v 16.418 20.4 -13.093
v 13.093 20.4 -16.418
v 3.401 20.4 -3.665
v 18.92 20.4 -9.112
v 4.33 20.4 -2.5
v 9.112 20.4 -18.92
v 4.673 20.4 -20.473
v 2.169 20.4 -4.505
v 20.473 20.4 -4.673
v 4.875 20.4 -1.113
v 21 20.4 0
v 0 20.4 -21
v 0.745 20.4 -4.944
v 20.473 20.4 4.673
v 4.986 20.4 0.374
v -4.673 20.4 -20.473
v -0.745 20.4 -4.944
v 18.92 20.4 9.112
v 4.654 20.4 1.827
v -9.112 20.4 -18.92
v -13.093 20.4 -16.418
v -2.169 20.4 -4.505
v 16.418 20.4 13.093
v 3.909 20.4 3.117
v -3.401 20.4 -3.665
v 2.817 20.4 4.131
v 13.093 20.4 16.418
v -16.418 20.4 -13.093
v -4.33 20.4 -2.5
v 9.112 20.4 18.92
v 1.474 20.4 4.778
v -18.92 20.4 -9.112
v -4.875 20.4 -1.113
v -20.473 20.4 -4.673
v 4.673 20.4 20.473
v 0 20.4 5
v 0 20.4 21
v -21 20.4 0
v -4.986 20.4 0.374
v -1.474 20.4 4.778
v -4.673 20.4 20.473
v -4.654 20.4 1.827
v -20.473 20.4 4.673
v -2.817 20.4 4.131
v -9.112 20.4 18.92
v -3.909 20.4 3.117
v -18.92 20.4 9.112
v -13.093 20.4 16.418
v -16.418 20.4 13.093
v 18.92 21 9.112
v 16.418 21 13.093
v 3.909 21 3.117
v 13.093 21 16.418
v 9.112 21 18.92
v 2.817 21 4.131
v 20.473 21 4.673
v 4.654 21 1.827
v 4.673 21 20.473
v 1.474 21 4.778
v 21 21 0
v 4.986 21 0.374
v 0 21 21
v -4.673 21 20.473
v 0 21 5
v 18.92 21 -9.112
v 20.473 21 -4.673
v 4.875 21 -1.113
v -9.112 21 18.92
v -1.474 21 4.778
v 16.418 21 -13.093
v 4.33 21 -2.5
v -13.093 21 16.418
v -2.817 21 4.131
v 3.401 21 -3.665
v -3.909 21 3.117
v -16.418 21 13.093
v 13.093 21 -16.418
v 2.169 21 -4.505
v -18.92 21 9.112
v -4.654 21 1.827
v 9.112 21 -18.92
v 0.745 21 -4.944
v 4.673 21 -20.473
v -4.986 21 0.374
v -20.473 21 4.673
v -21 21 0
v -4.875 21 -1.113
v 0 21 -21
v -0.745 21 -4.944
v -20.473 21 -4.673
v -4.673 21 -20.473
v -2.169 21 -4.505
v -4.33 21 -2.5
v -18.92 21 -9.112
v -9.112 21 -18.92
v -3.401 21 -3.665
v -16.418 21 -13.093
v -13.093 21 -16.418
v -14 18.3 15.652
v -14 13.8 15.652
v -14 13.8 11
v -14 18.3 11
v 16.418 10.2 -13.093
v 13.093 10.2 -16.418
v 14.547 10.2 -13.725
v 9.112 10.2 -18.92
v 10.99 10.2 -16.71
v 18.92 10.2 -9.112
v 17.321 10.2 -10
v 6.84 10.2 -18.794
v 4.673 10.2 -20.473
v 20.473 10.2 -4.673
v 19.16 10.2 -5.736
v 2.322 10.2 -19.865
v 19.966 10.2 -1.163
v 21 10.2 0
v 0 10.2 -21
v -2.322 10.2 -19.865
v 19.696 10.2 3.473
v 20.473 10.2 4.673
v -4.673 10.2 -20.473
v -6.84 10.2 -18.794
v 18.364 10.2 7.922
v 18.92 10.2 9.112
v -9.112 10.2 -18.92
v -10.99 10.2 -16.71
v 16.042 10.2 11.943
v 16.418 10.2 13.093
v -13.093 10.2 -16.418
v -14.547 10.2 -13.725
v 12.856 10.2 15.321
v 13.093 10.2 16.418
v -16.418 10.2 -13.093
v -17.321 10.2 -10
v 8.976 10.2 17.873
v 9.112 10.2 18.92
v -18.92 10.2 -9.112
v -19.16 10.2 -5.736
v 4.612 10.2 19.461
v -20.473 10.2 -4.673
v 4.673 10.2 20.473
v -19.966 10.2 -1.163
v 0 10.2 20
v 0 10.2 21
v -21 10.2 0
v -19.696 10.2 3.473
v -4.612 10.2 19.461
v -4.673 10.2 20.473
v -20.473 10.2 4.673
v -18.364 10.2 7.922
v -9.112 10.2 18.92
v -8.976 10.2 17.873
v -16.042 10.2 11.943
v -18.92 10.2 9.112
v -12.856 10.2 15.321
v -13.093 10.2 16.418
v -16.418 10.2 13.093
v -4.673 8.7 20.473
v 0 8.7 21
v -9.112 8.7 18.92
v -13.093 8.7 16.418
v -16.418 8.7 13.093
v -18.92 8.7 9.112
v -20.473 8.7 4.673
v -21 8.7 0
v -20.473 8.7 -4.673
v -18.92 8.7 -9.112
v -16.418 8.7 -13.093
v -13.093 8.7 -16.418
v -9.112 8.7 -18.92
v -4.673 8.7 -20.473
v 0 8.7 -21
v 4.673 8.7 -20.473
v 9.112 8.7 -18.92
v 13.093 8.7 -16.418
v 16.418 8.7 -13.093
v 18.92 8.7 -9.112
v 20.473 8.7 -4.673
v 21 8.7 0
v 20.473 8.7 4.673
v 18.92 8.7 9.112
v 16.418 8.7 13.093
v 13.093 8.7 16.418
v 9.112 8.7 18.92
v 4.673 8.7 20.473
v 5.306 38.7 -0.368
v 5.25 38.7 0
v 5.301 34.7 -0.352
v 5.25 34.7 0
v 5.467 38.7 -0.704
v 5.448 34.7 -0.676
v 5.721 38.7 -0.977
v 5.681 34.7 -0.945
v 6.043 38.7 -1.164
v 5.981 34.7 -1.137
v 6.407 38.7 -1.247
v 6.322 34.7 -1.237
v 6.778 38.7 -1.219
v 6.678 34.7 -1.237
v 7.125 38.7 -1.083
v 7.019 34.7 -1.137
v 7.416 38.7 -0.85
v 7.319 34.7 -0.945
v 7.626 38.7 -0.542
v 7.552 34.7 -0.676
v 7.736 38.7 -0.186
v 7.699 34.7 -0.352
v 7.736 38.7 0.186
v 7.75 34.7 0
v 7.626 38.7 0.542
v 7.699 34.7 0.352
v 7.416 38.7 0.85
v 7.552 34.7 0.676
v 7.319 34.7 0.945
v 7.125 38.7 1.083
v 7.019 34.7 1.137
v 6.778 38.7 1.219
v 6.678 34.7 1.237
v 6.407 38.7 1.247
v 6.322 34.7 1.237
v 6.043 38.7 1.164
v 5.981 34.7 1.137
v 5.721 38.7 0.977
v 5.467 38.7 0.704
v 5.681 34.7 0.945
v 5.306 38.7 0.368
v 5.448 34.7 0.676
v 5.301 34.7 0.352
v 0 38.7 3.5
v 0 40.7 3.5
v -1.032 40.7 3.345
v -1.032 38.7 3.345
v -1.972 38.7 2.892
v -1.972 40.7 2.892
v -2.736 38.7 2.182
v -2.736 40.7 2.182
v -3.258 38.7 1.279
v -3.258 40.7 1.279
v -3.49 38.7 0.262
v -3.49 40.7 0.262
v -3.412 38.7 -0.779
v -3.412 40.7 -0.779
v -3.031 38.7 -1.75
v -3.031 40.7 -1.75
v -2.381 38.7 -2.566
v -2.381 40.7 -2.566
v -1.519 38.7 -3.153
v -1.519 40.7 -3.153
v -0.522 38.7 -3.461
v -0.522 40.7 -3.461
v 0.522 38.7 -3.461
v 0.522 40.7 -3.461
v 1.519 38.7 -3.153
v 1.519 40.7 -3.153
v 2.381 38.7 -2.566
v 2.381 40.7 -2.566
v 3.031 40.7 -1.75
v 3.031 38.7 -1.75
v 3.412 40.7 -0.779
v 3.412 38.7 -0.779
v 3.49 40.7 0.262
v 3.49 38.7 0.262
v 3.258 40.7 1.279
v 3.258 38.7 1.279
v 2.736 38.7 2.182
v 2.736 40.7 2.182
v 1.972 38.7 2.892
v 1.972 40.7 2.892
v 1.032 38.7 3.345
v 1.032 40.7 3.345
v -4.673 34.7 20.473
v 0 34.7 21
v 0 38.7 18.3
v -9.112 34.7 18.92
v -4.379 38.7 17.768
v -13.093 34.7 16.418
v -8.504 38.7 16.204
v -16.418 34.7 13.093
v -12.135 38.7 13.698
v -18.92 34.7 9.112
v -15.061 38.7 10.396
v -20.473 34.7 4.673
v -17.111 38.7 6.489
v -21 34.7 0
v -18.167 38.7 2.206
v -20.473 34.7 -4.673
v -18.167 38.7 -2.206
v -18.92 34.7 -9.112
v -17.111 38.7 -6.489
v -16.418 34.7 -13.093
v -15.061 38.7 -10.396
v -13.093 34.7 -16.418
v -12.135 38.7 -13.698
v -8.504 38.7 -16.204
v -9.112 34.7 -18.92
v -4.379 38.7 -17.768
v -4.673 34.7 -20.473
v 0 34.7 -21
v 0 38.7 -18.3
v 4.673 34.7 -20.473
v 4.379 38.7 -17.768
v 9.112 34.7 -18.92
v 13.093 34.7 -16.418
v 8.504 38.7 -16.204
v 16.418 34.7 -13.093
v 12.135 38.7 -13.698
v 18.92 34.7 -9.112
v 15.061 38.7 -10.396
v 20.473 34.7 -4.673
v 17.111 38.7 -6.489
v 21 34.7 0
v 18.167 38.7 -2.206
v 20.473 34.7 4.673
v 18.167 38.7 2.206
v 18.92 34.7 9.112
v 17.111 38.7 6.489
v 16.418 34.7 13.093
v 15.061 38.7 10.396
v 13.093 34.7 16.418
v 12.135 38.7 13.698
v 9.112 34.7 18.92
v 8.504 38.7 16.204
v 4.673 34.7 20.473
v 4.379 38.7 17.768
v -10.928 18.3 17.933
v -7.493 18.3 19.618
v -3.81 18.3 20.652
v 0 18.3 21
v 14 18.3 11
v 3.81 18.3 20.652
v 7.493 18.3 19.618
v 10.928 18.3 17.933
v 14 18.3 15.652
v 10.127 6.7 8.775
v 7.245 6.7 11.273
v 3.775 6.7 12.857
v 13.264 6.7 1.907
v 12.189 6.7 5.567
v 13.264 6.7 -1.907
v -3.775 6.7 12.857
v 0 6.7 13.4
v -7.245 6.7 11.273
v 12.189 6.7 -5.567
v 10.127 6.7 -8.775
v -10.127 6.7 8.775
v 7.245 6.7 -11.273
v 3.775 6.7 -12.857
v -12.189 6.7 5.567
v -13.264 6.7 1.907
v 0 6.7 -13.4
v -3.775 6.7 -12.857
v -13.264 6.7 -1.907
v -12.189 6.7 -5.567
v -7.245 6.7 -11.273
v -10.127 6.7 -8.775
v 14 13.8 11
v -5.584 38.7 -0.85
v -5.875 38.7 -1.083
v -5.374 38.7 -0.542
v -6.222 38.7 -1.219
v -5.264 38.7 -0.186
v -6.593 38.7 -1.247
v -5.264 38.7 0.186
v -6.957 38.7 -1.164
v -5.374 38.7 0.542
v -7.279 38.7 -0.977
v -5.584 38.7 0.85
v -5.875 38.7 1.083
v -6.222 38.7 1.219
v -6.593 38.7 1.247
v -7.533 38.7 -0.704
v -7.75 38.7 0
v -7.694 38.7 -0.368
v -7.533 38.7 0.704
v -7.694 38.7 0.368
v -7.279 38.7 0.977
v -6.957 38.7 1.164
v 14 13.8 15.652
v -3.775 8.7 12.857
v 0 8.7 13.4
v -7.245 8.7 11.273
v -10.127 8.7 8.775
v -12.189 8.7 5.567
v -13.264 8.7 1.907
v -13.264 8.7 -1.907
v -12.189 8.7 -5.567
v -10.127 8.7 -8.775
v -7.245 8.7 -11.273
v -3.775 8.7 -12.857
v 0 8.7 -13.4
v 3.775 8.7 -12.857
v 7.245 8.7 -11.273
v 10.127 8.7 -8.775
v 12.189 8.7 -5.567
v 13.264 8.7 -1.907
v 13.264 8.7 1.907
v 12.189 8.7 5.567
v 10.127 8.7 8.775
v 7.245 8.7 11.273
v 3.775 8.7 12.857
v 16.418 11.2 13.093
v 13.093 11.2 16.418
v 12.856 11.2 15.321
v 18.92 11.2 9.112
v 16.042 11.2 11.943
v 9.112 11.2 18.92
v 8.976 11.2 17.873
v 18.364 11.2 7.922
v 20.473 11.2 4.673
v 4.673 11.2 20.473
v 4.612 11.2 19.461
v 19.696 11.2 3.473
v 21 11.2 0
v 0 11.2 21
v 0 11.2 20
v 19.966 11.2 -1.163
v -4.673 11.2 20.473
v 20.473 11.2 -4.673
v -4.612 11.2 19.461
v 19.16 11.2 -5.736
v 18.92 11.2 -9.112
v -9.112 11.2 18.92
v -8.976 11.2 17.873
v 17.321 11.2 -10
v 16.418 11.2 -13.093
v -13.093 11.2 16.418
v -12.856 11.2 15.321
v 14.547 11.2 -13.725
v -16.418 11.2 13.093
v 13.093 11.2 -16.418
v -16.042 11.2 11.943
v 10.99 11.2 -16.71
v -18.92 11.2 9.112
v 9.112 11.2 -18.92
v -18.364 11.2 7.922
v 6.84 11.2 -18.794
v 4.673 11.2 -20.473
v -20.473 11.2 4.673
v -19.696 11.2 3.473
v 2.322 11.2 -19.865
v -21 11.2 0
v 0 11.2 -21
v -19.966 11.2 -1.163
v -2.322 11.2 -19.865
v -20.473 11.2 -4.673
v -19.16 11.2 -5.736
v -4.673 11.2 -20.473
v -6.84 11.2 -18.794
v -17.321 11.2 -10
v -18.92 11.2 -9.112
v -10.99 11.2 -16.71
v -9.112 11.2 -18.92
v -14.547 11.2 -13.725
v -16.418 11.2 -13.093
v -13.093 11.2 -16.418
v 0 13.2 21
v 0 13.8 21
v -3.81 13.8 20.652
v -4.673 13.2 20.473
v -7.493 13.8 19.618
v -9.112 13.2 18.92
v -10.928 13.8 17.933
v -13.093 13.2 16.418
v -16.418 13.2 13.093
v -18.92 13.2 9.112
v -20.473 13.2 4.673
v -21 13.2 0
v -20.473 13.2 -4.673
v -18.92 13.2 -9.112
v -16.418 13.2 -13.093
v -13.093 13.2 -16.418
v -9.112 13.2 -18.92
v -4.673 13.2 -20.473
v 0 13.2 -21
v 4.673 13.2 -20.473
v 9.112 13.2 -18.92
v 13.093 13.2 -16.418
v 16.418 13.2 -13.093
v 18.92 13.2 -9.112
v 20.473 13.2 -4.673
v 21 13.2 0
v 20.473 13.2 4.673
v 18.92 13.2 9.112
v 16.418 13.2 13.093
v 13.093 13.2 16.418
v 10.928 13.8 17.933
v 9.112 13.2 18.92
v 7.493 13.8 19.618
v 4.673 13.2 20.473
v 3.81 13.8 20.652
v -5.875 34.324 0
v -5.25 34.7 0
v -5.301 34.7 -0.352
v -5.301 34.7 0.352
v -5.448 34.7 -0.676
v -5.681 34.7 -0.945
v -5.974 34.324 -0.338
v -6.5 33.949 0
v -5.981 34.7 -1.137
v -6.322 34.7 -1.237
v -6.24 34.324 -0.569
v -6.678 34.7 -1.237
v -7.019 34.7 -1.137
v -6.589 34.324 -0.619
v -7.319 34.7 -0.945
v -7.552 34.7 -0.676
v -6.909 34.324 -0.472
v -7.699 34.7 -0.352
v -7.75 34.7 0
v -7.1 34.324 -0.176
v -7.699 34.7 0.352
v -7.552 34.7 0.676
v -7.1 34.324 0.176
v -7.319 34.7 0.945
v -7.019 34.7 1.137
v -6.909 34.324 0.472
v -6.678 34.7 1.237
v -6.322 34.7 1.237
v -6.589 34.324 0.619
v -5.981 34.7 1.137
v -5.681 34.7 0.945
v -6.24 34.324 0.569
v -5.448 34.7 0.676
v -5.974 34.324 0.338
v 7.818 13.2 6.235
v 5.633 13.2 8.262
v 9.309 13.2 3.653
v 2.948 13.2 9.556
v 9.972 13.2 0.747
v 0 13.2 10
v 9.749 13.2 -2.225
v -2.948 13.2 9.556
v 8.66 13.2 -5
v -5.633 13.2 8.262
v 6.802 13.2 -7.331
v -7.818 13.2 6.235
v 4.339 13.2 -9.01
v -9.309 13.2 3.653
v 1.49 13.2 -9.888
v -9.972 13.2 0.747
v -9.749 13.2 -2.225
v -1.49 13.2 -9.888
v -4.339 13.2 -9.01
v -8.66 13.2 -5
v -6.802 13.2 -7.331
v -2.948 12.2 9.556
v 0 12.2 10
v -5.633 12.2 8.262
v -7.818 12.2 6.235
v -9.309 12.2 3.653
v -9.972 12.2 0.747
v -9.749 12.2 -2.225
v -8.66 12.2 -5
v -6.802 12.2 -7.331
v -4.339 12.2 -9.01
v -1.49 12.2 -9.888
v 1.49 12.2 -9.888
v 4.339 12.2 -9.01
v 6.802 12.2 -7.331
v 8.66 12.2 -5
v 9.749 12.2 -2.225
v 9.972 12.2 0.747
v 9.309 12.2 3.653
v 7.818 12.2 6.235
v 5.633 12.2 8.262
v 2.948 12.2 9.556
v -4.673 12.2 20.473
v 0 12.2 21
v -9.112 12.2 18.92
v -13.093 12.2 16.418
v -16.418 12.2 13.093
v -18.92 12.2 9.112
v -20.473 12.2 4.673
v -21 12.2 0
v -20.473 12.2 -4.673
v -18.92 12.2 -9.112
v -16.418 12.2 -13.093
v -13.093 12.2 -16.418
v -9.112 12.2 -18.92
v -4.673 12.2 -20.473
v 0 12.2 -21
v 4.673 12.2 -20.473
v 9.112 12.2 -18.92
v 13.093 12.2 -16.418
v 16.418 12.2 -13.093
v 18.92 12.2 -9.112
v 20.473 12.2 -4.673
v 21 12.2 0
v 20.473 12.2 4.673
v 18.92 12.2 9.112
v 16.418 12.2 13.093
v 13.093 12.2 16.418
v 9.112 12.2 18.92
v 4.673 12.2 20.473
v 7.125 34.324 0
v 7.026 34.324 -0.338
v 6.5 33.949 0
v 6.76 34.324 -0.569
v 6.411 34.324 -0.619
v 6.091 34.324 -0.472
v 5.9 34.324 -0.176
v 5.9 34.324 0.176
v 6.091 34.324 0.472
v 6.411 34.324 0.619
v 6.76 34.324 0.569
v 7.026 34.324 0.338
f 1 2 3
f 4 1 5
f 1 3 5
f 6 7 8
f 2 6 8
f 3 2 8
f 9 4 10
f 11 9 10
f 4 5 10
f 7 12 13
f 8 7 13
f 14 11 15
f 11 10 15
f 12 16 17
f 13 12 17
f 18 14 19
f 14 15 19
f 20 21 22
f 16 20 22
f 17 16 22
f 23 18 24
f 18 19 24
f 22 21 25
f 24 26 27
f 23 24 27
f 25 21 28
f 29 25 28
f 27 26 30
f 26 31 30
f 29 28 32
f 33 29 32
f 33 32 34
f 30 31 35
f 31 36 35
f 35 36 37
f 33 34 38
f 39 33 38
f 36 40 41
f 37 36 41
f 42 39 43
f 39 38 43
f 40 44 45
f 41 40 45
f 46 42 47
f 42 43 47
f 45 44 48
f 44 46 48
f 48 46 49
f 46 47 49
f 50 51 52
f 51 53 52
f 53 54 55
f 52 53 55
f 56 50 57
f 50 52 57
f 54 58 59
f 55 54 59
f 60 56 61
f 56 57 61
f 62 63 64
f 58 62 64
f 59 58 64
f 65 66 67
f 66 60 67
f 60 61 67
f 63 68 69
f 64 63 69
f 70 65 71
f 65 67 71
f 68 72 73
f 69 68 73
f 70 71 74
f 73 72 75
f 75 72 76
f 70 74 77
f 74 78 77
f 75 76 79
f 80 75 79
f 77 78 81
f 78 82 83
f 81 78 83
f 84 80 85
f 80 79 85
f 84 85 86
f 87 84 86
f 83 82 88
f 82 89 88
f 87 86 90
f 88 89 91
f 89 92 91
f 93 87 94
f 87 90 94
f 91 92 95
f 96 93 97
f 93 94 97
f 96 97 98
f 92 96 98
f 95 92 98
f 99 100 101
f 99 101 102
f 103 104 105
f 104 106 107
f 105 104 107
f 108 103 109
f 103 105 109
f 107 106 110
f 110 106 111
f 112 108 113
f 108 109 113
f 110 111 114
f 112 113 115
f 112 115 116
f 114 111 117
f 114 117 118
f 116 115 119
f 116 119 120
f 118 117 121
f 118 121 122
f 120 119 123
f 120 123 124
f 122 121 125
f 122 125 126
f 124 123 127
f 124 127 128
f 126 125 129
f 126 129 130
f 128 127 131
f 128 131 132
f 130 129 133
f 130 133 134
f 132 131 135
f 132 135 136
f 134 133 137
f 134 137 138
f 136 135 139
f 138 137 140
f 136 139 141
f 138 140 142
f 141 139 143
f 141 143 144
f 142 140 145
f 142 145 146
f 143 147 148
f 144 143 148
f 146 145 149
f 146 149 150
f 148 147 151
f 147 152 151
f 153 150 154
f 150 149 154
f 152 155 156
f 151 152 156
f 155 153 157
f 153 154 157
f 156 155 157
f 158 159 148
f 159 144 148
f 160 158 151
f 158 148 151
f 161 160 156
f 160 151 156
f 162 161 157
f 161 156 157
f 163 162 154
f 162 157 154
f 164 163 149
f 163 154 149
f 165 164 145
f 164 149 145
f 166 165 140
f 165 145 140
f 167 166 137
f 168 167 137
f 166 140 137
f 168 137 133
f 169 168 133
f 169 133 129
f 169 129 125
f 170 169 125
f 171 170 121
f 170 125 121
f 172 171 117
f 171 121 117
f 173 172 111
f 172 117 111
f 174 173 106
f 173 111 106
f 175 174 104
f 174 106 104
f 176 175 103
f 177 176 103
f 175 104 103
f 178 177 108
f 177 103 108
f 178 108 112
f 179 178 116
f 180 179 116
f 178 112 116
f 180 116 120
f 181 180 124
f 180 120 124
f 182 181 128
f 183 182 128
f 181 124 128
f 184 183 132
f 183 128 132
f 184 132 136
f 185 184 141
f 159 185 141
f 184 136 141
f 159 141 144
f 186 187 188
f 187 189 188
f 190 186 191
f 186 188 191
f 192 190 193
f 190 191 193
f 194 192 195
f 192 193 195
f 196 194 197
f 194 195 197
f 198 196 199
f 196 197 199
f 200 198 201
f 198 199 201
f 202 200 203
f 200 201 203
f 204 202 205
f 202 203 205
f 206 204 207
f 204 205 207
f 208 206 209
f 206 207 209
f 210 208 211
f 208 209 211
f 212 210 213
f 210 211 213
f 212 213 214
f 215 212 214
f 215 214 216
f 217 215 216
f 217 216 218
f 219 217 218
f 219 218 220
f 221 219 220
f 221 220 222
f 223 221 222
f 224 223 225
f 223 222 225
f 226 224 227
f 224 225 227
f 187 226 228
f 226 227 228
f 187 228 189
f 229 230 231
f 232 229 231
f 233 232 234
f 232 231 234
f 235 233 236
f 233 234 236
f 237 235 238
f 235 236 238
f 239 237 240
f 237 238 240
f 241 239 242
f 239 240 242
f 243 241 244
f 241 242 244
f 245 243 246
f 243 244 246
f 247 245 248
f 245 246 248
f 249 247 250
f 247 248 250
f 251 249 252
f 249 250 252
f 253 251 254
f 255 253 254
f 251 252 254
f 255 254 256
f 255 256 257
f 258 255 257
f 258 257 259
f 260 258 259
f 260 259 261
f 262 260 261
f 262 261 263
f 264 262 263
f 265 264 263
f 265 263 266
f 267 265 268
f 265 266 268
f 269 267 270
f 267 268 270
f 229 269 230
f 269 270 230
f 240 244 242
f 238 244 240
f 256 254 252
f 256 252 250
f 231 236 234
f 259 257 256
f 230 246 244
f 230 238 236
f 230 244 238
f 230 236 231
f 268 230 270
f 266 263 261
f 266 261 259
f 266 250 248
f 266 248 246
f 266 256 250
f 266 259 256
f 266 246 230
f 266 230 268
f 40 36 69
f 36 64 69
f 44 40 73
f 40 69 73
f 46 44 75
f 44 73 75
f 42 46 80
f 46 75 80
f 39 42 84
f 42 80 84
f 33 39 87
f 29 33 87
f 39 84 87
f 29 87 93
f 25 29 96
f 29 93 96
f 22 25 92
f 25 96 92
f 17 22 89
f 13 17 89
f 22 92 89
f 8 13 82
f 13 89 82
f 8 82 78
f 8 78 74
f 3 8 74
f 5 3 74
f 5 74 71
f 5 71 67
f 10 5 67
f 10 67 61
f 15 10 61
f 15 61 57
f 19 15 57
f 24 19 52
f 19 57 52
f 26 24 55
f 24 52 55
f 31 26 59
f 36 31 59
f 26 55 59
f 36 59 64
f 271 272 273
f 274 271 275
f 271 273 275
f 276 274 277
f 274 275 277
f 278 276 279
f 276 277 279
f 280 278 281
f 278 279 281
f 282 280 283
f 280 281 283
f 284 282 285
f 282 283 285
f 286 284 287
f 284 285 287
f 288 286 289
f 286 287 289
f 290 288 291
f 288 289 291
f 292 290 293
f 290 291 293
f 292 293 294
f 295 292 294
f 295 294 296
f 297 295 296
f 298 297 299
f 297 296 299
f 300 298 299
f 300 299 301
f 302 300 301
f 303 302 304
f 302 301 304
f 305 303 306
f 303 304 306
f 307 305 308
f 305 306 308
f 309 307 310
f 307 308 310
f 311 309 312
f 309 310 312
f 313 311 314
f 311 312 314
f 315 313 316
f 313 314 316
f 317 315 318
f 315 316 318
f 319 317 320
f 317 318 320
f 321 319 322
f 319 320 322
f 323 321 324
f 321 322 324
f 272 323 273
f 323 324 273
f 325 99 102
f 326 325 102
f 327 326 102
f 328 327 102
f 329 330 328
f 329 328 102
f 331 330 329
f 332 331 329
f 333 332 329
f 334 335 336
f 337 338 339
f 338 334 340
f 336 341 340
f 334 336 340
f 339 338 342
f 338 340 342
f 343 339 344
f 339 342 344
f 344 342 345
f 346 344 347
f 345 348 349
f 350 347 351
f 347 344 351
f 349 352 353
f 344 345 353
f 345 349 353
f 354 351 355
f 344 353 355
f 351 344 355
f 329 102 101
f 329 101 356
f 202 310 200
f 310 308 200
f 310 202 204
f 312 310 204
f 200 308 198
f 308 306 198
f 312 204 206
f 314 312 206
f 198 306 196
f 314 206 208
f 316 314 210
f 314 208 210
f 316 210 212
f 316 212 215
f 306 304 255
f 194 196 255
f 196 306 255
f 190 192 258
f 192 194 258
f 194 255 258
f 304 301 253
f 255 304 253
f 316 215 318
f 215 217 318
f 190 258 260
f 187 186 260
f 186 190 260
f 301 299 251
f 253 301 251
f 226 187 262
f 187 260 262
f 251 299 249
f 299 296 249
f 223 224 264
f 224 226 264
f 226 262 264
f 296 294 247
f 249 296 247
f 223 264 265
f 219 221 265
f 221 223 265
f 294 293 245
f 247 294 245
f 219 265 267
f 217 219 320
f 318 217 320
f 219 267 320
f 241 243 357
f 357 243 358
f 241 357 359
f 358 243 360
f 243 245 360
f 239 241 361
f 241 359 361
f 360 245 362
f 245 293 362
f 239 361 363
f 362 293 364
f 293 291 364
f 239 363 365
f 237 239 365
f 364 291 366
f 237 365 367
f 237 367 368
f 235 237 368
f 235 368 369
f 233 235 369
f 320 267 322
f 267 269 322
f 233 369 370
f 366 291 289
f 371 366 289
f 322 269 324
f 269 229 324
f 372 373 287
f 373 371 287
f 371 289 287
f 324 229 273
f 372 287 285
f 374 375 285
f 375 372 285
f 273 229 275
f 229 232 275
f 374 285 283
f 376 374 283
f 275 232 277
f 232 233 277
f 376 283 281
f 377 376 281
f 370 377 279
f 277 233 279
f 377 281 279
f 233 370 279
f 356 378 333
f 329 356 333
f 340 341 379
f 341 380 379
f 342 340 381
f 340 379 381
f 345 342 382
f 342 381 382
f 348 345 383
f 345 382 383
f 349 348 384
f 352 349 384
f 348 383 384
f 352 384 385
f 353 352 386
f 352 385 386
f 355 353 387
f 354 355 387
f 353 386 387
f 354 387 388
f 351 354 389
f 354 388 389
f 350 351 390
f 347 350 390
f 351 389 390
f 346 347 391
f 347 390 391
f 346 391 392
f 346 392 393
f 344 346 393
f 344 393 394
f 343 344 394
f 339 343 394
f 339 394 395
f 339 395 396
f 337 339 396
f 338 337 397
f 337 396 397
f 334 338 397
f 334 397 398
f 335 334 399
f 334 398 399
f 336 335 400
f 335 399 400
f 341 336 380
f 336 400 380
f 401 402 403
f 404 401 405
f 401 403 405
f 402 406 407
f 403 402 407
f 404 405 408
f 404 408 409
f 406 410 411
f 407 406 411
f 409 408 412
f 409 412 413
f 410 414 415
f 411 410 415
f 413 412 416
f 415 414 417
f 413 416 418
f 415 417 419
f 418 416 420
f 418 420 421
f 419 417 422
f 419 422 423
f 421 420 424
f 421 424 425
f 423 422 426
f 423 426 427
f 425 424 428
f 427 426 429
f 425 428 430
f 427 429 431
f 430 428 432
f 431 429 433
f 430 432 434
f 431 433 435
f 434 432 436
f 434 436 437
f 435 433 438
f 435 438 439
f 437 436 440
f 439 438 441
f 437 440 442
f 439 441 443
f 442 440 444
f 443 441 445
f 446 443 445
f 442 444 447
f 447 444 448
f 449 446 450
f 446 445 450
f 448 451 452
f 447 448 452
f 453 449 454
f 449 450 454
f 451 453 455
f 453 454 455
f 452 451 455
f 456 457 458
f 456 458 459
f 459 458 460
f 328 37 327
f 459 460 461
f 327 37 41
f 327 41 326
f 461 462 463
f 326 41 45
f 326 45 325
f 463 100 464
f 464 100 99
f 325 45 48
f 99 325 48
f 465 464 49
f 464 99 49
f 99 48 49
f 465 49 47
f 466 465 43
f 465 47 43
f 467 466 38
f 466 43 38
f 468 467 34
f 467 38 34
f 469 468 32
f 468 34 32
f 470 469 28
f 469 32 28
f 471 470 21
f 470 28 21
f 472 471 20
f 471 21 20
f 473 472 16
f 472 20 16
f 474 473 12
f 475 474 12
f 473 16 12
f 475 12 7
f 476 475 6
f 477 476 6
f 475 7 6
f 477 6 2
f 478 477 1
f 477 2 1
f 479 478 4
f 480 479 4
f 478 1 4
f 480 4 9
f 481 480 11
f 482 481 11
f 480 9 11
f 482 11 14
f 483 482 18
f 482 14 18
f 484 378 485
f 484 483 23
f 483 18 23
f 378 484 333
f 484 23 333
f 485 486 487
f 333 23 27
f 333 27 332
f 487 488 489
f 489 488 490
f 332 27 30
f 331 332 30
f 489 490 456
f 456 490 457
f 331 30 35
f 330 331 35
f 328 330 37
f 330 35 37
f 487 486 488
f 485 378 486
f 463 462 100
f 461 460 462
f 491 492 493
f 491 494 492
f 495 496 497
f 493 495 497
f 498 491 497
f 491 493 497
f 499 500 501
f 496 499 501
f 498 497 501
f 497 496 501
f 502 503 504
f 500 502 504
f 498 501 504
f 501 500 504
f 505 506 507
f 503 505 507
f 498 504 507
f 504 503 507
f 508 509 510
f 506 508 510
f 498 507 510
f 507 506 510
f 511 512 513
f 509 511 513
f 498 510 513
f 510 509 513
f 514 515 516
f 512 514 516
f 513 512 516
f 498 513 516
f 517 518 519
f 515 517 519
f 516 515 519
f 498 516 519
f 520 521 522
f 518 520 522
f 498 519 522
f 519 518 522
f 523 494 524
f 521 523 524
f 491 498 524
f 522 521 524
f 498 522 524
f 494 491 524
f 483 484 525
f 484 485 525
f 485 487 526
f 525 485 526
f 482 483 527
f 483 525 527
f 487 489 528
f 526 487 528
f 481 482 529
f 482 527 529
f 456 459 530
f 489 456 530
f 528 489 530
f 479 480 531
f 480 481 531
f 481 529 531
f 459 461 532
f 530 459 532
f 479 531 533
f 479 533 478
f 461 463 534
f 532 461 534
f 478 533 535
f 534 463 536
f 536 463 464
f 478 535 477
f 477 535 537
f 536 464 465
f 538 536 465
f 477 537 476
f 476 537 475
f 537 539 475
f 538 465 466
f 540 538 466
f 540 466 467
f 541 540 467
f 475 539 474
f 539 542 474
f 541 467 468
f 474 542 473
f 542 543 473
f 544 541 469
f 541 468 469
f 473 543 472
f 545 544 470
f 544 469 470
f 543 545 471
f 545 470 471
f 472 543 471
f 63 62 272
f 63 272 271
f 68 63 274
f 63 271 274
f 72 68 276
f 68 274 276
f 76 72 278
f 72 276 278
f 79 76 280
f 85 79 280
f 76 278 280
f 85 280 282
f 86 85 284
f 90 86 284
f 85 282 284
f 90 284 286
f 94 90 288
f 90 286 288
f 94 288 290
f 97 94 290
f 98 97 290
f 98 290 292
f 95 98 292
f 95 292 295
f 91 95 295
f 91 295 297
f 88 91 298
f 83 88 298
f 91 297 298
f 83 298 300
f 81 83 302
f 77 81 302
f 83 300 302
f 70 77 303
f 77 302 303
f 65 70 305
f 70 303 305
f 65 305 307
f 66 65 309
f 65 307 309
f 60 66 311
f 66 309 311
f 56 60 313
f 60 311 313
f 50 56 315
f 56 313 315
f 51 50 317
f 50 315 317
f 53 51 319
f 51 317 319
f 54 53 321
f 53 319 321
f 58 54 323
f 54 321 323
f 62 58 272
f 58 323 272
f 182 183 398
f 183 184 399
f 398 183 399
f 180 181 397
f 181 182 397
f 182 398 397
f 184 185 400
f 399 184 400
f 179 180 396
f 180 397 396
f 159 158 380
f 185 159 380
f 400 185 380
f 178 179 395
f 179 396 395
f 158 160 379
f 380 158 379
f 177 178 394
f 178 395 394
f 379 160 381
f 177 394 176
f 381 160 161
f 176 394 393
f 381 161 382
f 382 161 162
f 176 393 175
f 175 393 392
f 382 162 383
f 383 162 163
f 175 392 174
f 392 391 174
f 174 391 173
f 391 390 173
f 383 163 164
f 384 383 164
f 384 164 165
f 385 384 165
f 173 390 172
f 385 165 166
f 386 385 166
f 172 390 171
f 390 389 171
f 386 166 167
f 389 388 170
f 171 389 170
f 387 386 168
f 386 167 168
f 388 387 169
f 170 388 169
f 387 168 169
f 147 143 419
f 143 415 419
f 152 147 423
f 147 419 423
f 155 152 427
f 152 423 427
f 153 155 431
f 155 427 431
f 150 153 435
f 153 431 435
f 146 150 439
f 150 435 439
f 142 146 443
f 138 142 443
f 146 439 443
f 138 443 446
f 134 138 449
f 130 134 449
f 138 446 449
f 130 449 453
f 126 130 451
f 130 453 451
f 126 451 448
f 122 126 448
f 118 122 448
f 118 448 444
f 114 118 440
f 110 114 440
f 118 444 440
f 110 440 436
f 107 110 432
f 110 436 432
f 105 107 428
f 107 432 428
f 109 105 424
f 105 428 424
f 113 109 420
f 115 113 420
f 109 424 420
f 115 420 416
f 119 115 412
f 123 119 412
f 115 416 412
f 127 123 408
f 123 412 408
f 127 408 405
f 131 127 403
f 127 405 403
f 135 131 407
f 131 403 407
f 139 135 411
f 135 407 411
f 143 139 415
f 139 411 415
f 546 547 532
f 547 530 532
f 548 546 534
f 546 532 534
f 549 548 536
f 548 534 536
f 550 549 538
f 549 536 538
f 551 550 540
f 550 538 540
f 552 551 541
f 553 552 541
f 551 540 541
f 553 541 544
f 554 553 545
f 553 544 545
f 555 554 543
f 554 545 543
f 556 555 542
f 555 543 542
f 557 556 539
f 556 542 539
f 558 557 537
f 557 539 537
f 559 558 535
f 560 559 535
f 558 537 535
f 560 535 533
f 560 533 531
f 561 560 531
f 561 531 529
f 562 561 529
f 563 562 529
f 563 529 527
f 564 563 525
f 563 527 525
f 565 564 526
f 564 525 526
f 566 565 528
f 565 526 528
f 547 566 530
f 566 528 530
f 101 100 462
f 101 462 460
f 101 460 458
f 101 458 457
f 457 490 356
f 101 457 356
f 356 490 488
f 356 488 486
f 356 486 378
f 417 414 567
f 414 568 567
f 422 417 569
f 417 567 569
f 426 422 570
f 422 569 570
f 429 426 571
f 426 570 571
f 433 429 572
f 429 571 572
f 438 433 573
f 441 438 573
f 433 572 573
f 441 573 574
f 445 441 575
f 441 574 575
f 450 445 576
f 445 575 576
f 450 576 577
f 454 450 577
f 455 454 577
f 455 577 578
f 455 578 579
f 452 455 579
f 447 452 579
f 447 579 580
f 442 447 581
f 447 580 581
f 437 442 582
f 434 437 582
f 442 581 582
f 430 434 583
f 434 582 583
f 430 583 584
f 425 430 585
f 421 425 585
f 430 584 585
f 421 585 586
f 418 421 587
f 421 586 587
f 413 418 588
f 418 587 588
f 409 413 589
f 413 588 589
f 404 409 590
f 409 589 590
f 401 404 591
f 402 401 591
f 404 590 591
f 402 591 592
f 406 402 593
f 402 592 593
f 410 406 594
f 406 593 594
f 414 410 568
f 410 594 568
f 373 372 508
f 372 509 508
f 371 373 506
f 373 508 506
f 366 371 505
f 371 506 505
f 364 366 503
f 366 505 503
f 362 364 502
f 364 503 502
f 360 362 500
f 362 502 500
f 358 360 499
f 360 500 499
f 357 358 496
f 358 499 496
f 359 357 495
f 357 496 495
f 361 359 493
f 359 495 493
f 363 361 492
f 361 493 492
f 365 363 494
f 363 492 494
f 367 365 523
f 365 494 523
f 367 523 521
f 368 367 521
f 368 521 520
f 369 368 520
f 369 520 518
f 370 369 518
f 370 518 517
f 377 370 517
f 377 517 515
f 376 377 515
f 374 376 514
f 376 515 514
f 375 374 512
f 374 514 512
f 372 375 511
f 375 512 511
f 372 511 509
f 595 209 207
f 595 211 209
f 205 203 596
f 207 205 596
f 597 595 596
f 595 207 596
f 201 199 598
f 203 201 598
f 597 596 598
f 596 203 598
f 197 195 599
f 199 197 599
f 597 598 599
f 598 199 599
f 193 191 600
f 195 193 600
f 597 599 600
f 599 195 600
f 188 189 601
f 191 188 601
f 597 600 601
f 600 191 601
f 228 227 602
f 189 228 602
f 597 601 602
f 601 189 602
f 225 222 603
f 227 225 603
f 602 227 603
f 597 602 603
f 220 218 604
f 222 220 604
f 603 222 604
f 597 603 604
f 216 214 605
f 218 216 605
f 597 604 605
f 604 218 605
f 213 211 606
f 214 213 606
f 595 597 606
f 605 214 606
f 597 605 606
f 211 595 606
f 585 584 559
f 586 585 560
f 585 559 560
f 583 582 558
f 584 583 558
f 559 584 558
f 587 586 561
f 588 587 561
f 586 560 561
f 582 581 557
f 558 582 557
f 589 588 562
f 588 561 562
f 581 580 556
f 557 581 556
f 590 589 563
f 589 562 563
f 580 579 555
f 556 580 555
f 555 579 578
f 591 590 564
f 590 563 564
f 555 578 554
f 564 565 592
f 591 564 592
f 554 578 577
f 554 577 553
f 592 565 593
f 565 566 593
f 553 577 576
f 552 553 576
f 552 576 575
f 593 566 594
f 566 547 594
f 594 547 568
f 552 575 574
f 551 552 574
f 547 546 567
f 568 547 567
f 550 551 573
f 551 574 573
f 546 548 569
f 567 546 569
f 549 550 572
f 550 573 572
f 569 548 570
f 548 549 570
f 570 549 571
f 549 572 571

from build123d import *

# Parameters (mm, degrees)
SKETCH_2_W             = 28
SKETCH_2_H             = 4.5
CUT_EXTRUDE_1_DEPTH    = 10
HOLE_WIZARD_M3_1_D     = 2.5
HOLE_WIZARD_M3_1_DEPTH = 4
HOLE_WIZARD_M3_1_TIP   = 0.751075774
SKETCH_18_R            = 3.5
CUT_EXTRUDE_3_DEPTH    = 3
CUT_EXTRUDE_START      = -6.7
SKETCH_19_R            = 4.1
CUT_EXTRUDE_4_DEPTH    = 6.7


with BuildPart() as part:
    # 草图1 → 旋转1 (revolve)
    with BuildSketch(Plane.XY, mode=Mode.PRIVATE) as revolve_1_sk:
        Polygon((0, 0), (4.1, 0), (4.1, 6.7), (13.4, 6.7), (13.4, 8.7), (21, 8.7), (21, 10.2), (20, 10.2), (20, 11.2), (21, 11.2), (21, 12.2), (10, 12.2), (10, 13.2), (21, 13.2), (21, 20.4), (5, 20.4), (5, 21), (21, 21), (21, 34.7), (18.3, 38.7), (3.5, 38.7), (3.5, 43.7), (0, 43.7), align=None)
    revolve(revolve_1_sk.sketch.rotate(Axis((0, 43.7, 0), (0, -1, 0)), 90), axis=Axis((0, 43.7, 0), (0, -1, 0)))

    # 草图2 → 切除-拉伸1 (cut)
    with BuildSketch(Plane.XY.offset(21)):
        with Locations((0, 16.05)):
            Rectangle(SKETCH_2_W, SKETCH_2_H)
    extrude(amount=-CUT_EXTRUDE_1_DEPTH, mode=Mode.SUBTRACT)

    # M3 螺纹孔1
    with Locations(Plane(origin=(0, 38.7, 0), x_dir=(1, 0, 0), z_dir=(0, 1, 0))):
        with Locations((-6.5, 0), (6.5, 0)):
            Hole(HOLE_WIZARD_M3_1_D / 2, depth=HOLE_WIZARD_M3_1_DEPTH)
            with Locations((0, 0, -(HOLE_WIZARD_M3_1_DEPTH + HOLE_WIZARD_M3_1_TIP / 2))):  # 118° drill point
                Cone(0, HOLE_WIZARD_M3_1_D / 2, HOLE_WIZARD_M3_1_TIP, mode=Mode.SUBTRACT)

    # 草图18 → 切除-拉伸3 (cut)
    with BuildSketch(Plane(origin=(0, 43.7, 0), x_dir=(1, 0, 0), z_dir=(0, 1, 0))):
        with Locations(Location((0, 0, 0), (0, 0, 270))):
            Circle(SKETCH_18_R)
    extrude(amount=-CUT_EXTRUDE_3_DEPTH, mode=Mode.SUBTRACT)

    # 草图19 → 切除-拉伸4 (cut)
    with BuildSketch(Plane.XZ.offset(CUT_EXTRUDE_START)):
        Circle(SKETCH_19_R)
    extrude(amount=CUT_EXTRUDE_4_DEPTH, mode=Mode.SUBTRACT)


solid = part.part
